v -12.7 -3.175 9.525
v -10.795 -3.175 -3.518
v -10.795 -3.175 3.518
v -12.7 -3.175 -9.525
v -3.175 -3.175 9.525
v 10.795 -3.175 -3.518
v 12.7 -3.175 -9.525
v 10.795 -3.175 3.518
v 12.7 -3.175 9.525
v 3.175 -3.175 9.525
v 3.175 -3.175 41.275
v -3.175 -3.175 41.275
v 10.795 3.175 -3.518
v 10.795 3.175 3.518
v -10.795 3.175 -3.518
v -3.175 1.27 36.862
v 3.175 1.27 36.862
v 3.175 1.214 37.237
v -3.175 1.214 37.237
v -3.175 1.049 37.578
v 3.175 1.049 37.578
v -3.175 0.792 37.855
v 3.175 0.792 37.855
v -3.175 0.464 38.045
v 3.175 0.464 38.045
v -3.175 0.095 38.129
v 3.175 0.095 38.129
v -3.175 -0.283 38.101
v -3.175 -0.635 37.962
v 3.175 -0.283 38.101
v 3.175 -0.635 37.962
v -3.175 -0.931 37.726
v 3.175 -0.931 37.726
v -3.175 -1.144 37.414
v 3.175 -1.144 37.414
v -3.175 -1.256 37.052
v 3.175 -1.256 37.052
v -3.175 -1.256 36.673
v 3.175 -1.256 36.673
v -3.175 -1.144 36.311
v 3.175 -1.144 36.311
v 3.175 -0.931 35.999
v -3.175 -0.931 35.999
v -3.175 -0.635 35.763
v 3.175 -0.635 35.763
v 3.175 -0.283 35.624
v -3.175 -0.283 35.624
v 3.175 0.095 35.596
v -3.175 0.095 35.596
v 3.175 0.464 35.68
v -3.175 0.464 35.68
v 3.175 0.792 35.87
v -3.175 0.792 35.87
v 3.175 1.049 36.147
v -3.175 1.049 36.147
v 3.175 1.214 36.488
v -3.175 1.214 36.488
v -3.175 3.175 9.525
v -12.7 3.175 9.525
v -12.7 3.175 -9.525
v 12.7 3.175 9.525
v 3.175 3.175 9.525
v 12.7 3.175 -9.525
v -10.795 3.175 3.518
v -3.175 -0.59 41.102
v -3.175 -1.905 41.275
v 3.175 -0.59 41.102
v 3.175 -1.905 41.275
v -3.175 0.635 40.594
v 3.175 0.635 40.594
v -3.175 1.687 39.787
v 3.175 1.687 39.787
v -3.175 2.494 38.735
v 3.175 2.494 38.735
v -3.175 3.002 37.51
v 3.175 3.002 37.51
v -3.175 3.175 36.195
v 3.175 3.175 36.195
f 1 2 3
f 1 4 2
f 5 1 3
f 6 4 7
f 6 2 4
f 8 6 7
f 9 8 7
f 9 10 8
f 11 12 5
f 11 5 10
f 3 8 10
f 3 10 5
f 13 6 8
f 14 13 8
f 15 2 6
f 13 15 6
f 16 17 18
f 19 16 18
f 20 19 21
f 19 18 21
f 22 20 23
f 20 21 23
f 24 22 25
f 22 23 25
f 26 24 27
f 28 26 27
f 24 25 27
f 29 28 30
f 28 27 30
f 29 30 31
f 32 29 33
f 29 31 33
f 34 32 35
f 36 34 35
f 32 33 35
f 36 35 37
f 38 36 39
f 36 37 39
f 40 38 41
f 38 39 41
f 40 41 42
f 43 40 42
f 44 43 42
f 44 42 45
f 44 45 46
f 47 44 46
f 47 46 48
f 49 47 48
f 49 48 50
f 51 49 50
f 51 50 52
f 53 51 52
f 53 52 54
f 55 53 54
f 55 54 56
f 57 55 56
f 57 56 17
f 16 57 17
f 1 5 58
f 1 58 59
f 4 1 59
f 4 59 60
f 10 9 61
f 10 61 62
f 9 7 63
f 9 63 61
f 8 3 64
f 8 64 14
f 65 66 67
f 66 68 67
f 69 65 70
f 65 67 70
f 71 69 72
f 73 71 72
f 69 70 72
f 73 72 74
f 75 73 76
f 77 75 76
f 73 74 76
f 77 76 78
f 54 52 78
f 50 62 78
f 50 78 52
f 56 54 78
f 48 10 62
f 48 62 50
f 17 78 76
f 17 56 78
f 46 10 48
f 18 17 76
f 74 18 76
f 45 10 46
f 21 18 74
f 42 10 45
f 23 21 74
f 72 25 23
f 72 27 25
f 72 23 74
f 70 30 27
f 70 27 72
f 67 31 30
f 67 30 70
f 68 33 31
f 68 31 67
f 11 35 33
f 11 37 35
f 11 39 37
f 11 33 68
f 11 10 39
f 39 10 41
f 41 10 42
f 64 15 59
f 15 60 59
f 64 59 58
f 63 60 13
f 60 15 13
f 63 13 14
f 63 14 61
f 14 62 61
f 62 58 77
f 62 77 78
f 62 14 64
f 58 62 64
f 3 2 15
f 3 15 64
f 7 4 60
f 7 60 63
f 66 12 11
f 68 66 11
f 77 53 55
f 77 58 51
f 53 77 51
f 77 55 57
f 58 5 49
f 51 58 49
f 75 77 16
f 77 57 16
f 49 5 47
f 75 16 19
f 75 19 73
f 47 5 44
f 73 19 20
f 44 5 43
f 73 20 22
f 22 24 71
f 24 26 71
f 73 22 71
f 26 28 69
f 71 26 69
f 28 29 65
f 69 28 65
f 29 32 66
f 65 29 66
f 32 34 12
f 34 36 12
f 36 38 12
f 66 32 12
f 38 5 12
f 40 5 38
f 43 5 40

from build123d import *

# Parameters (mm, degrees)
F0_W     = 6.35
F0_H     = 31.75
F1_DEPTH = 3.175
F2_R     = 5.08
F3_R     = 1.27
F4_DEPTH = 53.34
F5_W     = 21.59
F5_H     = 7.036624
F6_DEPTH = 25.4


with BuildPart() as f1:
    # F0 (on Front) → F1 (new body, symmetric)
    with BuildSketch(Plane.XZ):
        with Locations((0, 25.4)):
            Rectangle(F0_W, F0_H)
        Polygon((3.175, 9.525), (-3.175, 9.525), (-12.7, 9.525), (-12.7, -9.525), (12.7, -9.525), (12.7, 9.525), align=None)
    extrude(amount=F1_DEPTH, both=True)

    # F2
    f2_edges = [f1.edges().sort_by_distance(p)[0] for p in [
        (0, 3.175, 41.275),
    ]]
    fillet(f2_edges, radius=F2_R)

    # F3 (on face) → F4 (cut)
    with BuildSketch(Plane.YZ.offset(3.175)):
        with Locations((0, 36.86247)):
            Circle(F3_R)
    extrude(amount=-F4_DEPTH, mode=Mode.SUBTRACT)

    # F5 (on face) → F6 (cut, symmetric)
    with BuildSketch(Plane.XZ.offset(3.175)):
        Rectangle(F5_W, F5_H)
    extrude(amount=F6_DEPTH, both=True, mode=Mode.SUBTRACT)


solid = f1.part
